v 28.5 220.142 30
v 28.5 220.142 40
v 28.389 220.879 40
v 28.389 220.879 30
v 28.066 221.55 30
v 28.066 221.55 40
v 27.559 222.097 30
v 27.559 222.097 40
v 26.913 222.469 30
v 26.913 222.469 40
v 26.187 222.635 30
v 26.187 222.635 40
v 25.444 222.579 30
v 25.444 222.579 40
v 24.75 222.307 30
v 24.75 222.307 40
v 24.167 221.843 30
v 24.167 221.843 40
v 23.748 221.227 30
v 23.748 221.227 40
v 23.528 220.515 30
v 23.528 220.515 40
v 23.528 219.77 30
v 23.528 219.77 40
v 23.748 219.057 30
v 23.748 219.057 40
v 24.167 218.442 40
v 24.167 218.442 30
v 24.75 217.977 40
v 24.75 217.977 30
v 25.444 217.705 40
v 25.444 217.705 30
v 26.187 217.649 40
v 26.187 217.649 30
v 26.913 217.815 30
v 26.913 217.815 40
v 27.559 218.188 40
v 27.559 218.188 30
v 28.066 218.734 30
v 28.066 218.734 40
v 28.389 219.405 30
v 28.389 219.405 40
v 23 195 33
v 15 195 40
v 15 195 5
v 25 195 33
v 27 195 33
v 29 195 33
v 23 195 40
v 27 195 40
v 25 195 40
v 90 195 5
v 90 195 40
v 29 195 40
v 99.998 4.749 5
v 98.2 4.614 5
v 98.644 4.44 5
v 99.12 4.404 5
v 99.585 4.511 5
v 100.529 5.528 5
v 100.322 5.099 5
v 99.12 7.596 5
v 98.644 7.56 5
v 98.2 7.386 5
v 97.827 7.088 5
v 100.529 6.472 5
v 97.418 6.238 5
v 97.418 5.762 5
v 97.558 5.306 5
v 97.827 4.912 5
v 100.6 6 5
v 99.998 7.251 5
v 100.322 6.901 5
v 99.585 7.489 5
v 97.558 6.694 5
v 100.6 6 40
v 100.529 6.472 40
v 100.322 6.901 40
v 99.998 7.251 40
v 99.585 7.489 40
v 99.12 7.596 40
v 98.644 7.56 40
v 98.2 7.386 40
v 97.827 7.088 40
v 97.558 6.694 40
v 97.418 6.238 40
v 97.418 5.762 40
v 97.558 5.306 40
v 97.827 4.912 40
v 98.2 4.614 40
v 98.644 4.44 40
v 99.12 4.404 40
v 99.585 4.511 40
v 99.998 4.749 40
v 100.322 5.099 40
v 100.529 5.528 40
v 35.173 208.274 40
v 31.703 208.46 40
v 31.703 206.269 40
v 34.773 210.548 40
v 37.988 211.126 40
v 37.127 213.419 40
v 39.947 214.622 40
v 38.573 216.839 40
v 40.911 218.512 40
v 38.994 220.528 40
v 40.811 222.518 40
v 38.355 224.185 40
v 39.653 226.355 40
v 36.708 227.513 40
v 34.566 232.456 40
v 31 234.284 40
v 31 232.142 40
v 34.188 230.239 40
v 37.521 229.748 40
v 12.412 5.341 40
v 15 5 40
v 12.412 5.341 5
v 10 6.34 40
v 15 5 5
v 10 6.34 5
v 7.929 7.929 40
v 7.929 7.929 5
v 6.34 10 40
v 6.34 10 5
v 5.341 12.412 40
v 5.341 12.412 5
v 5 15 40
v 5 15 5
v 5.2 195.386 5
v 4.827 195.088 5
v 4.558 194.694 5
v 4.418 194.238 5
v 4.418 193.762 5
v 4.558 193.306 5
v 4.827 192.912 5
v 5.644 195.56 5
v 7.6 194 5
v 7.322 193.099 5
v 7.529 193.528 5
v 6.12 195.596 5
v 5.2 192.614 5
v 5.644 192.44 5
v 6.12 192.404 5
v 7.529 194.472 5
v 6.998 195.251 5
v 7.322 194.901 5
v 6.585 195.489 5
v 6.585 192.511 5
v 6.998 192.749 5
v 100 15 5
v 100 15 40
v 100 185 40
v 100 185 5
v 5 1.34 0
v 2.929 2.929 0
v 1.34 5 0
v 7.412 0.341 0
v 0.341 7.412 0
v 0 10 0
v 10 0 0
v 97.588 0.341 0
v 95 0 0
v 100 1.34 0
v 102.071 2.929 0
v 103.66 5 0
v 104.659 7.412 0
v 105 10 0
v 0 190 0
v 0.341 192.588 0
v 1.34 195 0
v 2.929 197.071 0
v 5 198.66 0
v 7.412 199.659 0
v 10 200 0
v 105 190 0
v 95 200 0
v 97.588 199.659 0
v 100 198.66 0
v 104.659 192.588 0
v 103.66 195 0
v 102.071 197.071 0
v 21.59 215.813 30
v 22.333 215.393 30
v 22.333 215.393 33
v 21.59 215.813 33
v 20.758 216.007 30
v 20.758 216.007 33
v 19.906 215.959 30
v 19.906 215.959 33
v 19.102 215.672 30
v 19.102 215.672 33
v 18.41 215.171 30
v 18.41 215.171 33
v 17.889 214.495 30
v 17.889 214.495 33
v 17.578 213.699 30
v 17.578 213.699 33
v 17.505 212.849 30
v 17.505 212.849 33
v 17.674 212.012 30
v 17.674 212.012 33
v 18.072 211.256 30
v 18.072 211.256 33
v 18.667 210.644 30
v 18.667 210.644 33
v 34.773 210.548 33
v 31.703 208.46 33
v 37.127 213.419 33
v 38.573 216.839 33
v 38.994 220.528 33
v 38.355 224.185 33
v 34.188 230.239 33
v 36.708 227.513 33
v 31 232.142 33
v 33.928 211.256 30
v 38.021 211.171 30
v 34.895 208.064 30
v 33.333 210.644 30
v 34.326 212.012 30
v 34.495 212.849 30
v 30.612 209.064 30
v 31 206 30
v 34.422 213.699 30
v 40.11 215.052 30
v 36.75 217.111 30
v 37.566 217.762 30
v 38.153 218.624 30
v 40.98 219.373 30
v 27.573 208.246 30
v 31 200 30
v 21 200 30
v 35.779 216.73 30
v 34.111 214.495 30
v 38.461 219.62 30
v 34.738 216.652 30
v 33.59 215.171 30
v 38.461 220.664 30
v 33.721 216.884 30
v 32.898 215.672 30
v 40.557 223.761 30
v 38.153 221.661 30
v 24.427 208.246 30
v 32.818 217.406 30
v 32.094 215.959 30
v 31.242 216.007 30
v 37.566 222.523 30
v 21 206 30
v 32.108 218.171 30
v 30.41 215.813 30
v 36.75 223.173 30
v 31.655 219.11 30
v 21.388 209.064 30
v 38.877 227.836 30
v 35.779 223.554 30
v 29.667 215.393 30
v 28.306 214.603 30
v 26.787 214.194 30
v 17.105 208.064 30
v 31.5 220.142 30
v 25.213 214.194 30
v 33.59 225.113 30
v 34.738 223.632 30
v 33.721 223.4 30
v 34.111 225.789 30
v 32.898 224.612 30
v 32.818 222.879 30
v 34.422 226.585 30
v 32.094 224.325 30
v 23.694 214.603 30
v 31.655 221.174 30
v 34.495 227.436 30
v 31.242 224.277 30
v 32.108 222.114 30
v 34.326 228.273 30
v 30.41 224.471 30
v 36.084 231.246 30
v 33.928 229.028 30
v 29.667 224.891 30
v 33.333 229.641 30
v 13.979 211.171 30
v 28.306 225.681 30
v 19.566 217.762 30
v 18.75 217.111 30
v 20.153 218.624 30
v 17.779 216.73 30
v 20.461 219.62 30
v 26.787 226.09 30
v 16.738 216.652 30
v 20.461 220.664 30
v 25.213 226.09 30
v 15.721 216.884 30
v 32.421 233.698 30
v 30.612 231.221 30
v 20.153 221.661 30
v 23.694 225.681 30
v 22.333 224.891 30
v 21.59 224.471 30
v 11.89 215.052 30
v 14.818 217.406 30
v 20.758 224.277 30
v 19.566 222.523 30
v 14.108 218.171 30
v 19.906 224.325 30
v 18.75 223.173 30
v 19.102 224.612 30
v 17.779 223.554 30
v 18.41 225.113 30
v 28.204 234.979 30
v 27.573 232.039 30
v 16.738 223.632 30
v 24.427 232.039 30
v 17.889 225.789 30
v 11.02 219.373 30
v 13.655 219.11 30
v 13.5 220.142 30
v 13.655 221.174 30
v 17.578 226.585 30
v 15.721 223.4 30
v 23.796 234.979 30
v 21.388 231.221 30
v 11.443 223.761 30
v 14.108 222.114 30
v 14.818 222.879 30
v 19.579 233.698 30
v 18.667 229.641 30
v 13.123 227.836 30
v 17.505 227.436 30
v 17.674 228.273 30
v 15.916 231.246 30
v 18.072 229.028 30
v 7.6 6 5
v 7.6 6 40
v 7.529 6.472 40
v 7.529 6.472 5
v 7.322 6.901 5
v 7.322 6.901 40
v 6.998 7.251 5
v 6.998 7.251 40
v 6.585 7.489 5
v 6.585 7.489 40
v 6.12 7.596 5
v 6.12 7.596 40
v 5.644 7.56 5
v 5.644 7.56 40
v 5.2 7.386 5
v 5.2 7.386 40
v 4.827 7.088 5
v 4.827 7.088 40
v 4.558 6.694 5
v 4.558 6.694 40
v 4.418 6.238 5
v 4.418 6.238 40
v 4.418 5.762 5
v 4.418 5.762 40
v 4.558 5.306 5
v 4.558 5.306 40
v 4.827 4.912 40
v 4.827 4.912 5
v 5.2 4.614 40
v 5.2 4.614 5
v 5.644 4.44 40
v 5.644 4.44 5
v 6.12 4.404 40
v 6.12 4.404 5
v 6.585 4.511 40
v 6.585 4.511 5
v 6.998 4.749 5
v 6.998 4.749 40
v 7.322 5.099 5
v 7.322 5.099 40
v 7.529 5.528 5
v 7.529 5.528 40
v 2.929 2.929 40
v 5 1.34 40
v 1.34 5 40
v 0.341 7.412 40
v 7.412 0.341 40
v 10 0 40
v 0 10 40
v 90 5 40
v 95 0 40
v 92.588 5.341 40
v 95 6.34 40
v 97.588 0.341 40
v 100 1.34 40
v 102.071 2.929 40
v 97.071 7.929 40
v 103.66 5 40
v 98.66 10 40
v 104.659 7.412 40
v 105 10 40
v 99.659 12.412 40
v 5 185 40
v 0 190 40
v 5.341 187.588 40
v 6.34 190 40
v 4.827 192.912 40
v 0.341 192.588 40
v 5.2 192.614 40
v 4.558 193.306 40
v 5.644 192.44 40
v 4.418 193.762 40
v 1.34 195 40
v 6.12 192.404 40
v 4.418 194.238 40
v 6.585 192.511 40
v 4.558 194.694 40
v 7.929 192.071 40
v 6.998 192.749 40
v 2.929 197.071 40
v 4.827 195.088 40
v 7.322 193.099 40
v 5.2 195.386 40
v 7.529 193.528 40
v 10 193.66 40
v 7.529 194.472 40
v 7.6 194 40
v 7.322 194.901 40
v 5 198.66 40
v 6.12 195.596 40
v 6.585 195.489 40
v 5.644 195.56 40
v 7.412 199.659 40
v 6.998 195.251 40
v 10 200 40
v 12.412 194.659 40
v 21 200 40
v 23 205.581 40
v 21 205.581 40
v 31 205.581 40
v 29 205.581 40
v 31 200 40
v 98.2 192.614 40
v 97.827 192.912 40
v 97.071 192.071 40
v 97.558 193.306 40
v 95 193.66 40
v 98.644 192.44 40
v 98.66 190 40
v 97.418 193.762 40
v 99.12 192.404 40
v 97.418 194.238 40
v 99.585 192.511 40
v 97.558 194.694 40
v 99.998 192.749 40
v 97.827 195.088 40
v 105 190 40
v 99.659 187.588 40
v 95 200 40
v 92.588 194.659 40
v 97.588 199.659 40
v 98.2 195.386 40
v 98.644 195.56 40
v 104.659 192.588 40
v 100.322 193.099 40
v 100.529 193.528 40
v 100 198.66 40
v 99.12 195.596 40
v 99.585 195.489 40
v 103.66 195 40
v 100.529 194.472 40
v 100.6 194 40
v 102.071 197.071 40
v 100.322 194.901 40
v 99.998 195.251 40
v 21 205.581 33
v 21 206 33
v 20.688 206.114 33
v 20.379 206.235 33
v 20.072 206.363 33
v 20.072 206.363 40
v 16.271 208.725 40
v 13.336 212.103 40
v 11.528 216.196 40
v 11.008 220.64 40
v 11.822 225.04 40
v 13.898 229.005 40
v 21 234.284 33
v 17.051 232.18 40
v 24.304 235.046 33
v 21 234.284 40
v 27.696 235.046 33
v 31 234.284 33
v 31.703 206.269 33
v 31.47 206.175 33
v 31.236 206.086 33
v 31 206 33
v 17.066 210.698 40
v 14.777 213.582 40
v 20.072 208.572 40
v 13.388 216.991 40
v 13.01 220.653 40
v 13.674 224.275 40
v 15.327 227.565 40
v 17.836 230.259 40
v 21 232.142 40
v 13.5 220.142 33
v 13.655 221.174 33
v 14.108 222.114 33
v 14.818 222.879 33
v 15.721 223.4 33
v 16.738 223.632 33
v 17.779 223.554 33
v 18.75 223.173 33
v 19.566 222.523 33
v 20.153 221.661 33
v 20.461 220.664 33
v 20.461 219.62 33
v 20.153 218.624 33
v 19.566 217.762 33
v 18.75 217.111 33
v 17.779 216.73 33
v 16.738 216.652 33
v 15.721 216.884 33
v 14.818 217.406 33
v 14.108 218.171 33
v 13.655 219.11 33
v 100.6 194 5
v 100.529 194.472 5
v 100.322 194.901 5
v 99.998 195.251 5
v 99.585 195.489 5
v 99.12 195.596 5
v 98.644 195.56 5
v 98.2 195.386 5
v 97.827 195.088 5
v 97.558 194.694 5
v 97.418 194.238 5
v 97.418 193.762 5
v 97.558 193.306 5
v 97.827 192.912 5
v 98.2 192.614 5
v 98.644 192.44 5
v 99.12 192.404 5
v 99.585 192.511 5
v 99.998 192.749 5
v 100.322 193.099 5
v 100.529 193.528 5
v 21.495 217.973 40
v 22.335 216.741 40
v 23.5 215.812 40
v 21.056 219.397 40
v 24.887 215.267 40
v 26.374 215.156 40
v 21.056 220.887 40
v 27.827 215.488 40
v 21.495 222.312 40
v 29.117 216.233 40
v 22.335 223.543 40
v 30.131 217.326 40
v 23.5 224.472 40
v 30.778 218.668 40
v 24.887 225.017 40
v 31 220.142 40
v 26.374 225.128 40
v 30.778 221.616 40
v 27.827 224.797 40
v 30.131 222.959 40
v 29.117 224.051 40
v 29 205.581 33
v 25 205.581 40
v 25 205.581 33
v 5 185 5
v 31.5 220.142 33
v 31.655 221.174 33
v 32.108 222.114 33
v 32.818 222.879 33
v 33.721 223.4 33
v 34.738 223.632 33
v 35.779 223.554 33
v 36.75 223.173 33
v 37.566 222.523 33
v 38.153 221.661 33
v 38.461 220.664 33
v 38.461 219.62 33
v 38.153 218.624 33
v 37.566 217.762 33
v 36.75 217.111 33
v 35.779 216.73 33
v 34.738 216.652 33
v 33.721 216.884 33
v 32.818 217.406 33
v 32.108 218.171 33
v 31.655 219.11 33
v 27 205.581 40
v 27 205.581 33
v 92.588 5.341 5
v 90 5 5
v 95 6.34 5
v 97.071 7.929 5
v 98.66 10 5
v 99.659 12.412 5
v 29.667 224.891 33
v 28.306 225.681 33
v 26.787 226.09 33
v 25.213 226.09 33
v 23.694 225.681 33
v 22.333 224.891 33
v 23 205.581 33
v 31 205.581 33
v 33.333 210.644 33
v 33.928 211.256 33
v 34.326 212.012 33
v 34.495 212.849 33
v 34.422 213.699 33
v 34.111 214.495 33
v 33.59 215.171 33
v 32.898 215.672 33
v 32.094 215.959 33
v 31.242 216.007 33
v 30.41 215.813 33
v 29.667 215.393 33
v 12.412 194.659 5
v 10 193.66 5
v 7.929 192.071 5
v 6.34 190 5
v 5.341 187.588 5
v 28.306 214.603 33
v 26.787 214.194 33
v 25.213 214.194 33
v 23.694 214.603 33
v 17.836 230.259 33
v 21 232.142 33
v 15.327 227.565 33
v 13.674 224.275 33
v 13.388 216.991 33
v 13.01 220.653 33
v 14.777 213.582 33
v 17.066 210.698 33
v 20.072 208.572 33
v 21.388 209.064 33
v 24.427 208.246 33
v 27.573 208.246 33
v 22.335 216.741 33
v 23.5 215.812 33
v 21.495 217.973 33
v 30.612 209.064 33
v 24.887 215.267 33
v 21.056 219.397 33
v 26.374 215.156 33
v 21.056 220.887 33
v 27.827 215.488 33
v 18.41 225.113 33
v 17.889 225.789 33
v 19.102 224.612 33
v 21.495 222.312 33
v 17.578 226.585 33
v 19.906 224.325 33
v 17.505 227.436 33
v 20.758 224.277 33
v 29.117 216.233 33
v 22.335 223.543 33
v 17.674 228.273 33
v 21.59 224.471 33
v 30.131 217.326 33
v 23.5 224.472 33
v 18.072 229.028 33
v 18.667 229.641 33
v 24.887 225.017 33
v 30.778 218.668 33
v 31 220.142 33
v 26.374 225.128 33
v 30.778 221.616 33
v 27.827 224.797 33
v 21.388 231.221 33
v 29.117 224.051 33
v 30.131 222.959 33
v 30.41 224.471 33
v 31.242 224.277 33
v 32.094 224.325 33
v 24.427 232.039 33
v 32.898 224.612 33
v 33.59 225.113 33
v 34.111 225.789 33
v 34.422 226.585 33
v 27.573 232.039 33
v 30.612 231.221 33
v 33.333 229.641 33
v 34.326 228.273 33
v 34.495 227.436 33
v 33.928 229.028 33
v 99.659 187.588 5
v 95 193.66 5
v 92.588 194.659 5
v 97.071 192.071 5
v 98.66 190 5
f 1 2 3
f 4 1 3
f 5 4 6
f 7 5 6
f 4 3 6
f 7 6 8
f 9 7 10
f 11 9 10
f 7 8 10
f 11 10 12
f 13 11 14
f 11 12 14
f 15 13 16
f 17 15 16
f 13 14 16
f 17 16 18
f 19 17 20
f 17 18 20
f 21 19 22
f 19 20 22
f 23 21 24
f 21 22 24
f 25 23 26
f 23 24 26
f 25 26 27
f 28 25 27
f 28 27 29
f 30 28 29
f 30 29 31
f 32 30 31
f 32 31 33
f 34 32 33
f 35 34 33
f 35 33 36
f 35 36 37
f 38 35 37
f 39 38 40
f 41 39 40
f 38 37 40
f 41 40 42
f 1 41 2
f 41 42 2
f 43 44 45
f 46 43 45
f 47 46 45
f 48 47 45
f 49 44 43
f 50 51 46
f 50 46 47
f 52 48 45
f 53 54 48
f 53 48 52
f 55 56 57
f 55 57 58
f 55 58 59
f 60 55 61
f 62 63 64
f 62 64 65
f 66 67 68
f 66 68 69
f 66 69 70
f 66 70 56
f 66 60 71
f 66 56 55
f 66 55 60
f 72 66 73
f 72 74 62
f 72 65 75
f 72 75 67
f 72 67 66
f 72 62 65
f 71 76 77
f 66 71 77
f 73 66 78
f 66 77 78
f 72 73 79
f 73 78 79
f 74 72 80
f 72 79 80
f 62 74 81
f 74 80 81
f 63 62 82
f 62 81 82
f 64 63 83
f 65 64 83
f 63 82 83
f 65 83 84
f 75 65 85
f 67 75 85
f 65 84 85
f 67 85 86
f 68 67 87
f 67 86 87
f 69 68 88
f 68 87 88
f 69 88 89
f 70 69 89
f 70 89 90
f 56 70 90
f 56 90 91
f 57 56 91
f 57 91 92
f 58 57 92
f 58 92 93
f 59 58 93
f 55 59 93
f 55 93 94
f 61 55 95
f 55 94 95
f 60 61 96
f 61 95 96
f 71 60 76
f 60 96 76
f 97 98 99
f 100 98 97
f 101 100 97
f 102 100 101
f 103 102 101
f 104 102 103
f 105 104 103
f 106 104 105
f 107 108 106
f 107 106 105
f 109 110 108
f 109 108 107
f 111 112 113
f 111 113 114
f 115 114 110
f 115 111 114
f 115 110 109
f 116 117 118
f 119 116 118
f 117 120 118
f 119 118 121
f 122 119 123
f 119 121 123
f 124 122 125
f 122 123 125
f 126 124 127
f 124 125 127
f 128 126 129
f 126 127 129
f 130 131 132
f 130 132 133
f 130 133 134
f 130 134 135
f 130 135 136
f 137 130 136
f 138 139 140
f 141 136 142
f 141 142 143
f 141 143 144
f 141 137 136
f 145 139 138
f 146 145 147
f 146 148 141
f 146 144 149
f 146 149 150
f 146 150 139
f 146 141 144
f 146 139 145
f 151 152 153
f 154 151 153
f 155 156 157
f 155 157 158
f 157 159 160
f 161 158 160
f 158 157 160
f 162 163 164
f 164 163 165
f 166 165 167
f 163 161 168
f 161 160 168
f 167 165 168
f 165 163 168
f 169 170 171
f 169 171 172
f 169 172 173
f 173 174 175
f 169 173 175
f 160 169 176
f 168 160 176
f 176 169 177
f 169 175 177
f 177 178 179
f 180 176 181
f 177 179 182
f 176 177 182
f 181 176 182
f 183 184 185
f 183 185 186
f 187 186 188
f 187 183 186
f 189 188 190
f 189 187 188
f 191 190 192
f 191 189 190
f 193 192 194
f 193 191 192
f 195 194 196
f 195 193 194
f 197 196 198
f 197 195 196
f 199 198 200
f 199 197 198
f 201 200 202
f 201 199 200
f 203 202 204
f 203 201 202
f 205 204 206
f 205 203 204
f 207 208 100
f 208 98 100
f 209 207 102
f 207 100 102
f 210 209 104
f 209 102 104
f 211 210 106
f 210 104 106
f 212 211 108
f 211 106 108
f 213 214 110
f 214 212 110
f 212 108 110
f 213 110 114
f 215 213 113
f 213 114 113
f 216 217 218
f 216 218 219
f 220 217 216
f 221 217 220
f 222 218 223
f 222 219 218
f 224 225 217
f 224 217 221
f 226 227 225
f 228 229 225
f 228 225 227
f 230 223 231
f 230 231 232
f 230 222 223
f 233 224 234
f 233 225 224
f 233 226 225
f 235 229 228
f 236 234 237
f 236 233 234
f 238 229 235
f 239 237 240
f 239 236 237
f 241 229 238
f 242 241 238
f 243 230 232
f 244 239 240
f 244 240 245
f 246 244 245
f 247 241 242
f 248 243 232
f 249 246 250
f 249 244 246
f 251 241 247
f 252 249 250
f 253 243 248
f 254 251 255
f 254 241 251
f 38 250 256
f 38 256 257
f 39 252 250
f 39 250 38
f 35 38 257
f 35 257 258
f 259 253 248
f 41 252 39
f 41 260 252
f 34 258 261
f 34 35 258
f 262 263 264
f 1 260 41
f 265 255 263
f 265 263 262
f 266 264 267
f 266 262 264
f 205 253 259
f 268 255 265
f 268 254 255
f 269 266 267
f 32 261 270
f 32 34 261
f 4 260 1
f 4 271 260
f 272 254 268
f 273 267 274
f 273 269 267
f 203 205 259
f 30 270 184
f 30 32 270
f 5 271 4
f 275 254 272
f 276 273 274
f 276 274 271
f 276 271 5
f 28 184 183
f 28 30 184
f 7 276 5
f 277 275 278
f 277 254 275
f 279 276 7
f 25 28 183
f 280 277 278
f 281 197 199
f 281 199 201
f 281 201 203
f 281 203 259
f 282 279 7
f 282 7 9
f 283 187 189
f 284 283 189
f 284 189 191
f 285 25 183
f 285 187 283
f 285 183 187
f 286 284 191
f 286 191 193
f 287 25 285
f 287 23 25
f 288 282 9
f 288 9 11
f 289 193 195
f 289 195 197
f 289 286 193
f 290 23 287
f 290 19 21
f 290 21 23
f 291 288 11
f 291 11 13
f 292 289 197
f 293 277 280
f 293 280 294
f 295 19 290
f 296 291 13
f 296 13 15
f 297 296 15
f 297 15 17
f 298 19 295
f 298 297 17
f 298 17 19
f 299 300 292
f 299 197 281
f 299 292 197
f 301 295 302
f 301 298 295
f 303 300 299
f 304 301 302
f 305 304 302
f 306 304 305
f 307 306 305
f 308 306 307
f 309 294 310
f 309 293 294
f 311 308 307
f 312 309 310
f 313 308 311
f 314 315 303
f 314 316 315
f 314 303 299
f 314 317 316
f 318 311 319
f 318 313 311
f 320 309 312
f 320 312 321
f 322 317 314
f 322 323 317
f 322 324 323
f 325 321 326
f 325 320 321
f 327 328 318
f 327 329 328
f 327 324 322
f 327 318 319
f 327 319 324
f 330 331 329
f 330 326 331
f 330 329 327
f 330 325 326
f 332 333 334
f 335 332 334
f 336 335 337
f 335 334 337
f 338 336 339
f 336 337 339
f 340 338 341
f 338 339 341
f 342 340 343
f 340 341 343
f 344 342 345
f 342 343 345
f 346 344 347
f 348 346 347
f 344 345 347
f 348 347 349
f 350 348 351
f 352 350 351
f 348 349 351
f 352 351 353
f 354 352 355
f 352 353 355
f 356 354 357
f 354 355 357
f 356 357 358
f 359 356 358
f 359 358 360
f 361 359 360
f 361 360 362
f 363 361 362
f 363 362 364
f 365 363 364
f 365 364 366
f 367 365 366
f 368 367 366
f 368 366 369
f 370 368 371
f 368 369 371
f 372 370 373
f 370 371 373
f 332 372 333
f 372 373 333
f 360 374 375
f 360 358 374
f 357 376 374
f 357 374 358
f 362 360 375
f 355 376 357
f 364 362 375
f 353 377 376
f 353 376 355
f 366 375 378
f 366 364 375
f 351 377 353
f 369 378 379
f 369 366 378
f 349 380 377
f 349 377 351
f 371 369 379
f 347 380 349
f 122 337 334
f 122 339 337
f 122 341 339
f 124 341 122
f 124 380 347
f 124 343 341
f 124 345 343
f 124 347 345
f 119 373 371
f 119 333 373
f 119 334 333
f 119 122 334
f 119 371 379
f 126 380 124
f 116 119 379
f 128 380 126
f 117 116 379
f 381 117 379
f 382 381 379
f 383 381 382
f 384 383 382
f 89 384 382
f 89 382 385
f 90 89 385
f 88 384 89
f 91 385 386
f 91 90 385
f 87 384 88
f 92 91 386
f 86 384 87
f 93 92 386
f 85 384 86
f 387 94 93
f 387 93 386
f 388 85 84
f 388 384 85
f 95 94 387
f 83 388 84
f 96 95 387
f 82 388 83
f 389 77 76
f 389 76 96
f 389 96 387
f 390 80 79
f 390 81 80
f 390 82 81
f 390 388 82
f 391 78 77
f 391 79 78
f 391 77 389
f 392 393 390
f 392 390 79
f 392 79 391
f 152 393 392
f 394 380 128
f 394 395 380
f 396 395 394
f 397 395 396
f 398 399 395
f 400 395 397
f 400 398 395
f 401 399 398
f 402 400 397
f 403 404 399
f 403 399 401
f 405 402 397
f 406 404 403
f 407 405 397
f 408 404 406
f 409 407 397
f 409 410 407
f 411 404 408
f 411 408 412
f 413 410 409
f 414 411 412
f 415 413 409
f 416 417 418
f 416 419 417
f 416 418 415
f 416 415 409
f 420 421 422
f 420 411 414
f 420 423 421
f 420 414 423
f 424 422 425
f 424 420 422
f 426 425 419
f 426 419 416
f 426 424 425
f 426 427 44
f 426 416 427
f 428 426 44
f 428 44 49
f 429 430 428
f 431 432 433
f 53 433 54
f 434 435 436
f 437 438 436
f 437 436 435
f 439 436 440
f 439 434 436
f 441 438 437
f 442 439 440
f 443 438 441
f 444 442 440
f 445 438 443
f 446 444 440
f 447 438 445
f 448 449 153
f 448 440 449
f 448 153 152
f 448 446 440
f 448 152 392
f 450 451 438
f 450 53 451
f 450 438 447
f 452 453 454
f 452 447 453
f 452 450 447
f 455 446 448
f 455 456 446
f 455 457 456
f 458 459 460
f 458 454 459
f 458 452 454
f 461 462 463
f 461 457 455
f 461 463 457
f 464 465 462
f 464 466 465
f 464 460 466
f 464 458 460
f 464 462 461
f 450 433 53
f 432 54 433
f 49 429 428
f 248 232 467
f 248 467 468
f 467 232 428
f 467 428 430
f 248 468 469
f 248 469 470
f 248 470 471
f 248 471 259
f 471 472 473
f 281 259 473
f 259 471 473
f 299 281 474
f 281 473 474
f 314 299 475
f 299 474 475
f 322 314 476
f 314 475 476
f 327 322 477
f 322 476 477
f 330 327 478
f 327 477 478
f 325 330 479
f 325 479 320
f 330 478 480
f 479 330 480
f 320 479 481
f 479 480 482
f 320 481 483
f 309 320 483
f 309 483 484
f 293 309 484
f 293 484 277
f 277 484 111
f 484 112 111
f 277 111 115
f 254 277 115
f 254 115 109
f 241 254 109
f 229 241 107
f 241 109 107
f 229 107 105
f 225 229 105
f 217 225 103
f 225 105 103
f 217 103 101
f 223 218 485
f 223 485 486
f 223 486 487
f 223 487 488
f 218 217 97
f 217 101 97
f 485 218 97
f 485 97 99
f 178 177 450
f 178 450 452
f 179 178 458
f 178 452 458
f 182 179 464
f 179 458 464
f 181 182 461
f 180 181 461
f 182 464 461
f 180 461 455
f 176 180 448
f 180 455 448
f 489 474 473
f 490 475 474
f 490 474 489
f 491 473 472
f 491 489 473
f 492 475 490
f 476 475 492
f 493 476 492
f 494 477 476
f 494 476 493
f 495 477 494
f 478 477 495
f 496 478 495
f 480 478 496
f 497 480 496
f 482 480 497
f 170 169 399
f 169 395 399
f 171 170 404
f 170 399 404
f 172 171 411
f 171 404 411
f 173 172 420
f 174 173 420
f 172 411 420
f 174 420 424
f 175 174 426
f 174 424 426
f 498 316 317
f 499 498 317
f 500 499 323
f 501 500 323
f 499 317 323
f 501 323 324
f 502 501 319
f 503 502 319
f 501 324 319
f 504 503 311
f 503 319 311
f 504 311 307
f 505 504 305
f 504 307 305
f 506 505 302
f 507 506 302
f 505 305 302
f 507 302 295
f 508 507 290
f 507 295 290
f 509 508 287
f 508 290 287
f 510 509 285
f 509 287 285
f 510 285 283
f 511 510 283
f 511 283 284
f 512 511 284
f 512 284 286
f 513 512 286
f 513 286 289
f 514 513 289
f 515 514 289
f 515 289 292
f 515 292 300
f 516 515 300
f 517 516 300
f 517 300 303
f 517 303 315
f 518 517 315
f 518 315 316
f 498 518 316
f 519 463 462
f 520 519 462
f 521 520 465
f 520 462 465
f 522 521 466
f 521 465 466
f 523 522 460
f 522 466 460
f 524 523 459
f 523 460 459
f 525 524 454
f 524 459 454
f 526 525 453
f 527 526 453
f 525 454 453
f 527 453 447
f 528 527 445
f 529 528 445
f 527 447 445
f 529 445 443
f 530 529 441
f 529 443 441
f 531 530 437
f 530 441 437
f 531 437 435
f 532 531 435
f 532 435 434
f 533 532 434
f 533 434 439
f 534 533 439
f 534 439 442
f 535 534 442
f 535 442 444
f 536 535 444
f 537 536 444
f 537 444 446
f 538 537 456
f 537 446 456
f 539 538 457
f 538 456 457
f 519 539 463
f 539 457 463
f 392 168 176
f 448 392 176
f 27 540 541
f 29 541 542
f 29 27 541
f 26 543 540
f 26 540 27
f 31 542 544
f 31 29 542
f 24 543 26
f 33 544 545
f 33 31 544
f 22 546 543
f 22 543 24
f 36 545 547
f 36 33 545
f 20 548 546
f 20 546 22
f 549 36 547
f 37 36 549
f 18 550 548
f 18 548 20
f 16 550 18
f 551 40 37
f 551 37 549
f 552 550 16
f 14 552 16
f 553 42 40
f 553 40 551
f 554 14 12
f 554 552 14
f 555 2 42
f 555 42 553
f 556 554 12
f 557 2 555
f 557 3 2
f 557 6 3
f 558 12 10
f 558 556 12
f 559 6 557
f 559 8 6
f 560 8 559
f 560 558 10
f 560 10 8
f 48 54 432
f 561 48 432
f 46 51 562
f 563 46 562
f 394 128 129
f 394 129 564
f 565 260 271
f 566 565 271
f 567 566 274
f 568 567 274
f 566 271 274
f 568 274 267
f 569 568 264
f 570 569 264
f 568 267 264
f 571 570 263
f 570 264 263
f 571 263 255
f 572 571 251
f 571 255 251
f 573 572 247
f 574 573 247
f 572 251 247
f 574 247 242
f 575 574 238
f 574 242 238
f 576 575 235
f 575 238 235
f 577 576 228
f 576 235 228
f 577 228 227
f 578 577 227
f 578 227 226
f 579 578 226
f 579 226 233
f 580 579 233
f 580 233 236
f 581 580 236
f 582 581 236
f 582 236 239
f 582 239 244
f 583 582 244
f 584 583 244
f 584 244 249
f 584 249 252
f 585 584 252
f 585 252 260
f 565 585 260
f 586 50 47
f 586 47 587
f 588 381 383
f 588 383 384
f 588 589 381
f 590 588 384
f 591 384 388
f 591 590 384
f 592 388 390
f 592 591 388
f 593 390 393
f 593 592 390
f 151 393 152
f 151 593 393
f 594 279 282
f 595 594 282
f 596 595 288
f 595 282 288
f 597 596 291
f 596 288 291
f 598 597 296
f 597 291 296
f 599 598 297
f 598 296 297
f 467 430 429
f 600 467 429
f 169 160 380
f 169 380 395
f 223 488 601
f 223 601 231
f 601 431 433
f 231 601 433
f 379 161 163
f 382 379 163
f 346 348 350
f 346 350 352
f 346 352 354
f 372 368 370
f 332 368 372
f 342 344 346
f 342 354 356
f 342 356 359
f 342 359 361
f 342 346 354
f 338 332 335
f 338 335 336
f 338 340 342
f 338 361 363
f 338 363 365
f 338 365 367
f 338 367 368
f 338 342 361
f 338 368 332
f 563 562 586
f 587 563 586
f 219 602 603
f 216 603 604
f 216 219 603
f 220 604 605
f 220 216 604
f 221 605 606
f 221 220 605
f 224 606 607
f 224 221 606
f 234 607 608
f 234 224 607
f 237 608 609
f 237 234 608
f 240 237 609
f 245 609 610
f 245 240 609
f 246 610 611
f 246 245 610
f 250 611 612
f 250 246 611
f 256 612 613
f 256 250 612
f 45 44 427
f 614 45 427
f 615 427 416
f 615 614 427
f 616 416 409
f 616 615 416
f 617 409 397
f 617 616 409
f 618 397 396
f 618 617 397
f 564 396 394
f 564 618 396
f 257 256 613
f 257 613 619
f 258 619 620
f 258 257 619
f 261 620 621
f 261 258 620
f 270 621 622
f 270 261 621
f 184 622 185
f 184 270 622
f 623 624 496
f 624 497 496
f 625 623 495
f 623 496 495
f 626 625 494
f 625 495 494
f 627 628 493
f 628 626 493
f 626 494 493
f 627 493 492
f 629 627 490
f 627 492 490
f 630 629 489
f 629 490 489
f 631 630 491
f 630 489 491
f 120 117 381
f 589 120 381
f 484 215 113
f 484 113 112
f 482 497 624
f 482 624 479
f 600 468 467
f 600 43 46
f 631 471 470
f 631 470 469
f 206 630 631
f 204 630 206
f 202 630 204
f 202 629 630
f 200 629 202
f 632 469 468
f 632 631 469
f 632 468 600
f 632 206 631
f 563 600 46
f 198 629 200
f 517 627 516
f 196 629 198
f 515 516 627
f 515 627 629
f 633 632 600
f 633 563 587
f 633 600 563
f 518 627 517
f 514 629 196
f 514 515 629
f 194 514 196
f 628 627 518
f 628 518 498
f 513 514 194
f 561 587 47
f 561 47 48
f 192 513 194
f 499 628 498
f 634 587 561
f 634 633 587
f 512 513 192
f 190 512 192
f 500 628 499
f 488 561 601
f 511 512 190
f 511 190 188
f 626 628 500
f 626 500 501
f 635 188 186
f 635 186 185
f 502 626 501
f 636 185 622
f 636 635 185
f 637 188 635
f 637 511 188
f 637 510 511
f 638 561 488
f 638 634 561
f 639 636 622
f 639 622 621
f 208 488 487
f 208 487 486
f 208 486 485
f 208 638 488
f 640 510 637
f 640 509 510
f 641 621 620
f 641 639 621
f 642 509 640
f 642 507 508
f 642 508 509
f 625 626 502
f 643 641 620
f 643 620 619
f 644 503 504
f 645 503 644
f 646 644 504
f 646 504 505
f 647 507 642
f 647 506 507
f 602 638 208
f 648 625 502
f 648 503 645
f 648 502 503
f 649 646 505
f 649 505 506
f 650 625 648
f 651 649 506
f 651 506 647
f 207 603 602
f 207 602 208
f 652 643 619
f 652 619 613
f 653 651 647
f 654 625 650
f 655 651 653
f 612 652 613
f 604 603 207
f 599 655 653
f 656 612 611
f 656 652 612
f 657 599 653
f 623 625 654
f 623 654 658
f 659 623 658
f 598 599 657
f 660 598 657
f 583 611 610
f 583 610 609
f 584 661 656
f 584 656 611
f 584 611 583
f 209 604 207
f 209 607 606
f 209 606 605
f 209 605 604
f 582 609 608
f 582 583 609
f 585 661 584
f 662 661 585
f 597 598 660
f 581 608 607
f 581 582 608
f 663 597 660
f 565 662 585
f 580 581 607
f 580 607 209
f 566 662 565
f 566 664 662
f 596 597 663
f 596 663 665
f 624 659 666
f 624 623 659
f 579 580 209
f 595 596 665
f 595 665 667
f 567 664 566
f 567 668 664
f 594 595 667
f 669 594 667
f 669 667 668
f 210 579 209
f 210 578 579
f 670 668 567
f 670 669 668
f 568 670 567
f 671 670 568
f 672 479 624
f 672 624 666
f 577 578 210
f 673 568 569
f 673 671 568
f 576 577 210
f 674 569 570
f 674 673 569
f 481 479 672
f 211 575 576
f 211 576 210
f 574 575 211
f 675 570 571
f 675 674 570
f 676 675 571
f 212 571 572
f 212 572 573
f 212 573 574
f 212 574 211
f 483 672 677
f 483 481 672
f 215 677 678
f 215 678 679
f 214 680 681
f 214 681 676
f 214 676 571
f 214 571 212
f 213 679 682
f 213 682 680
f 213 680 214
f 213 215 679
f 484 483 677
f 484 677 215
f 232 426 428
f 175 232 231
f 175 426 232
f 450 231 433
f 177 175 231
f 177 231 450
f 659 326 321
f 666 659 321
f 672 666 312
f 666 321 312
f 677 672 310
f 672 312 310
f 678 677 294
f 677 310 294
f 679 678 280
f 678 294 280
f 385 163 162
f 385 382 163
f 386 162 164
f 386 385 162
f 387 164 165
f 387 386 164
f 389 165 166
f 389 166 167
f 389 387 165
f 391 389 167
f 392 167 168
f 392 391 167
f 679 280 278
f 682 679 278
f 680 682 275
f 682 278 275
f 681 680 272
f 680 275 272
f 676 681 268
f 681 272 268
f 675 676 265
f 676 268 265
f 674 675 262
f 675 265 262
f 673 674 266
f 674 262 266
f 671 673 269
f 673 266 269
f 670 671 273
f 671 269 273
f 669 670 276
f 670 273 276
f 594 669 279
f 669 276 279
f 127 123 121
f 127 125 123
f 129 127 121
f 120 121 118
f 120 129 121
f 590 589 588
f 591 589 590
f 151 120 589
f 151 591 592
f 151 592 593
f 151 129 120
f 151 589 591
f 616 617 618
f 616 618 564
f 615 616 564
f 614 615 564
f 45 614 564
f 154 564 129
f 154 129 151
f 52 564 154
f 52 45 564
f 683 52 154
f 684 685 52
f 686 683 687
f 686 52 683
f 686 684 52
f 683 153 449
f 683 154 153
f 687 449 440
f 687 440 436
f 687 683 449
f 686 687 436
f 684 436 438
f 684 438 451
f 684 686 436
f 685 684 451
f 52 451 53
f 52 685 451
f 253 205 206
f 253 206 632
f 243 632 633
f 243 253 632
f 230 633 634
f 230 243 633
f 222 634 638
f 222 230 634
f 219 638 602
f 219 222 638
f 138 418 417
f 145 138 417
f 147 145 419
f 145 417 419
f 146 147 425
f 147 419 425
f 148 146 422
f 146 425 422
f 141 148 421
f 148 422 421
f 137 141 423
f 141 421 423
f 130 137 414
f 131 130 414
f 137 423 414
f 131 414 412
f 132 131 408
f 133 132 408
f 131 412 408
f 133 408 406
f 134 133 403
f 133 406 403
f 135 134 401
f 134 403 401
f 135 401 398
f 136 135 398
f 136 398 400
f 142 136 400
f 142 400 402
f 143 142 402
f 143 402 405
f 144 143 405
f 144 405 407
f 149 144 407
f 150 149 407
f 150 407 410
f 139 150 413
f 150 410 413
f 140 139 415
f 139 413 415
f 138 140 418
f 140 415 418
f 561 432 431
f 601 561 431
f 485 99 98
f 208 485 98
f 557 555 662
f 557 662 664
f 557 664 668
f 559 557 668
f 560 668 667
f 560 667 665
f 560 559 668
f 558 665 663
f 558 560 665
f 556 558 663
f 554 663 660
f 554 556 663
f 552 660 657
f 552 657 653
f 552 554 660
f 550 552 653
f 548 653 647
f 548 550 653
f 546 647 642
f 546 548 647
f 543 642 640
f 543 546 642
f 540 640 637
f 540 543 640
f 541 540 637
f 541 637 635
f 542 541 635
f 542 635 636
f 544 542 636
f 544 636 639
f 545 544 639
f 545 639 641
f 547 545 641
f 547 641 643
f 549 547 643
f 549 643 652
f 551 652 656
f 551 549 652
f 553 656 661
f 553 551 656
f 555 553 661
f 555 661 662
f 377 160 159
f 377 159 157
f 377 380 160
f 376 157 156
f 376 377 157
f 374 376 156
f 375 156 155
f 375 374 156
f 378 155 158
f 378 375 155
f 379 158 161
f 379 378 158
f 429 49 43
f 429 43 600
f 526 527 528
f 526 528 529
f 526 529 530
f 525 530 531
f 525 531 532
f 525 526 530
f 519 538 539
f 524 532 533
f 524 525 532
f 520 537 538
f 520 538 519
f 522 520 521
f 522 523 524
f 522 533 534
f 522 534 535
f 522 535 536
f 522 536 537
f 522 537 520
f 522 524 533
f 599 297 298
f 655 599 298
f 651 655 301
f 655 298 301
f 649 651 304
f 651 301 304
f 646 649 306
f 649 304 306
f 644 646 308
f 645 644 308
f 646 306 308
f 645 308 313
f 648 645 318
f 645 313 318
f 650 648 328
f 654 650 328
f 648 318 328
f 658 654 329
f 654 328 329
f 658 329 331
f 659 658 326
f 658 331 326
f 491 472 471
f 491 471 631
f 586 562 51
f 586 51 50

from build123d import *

# Parameters (mm, degrees)
SKETCH1_W           = 105
SKETCH1_H           = 200
BOSS_EXTRUDE1_DEPTH = 40
SKETCH2_W           = 95
SKETCH2_H           = 190
CUT_EXTRUDE1_DEPTH  = 35
FILLET1_R           = 10
SKETCH3_R           = 1.6
CUT_EXTRUDE2_DEPTH  = 35
BOSS_EXTRUDE2_DEPTH = 10
SKETCH6_R           = 2.5
CUT_EXTRUDE3_DEPTH  = 10
SKETCH7_R           = 13
SKETCH7_R_2         = 5
CUT_EXTRUDE5_DEPTH  = 7
SKETCH9_W           = 10
SKETCH9_H           = 4.718519443
CUT_EXTRUDE8_DEPTH  = 7
SKETCH10_W          = 11.630652226
SKETCH10_H          = 3.85031924
CUT_EXTRUDE11_DEPTH = 7
SKETCH11_W          = 2
SKETCH11_H          = 11.091513068
SKETCH11_H_2        = 11.156323384
CUT_EXTRUDE12_DEPTH = 7
CUT_EXTRUDE13_DEPTH = 7
SKETCH13_R          = 3.5
CUT_EXTRUDE14_DEPTH = 7


with BuildPart() as part:
    # Sketch1 → Boss-Extrude1 (new body)
    with BuildSketch(Plane.XY):
        with Locations((52.5, 100)):
            Rectangle(SKETCH1_W, SKETCH1_H)
    extrude(amount=BOSS_EXTRUDE1_DEPTH)

    # Sketch2 → Cut-Extrude1 (cut)
    with BuildSketch(Plane.XY.offset(40)):
        with Locations((52.5, 100)):
            Rectangle(SKETCH2_W, SKETCH2_H)
    extrude(amount=-CUT_EXTRUDE1_DEPTH, mode=Mode.SUBTRACT)

    # Fillet1
    fillet1_edges = [part.edges().sort_by_distance(p)[0] for p in [
        (5, 195, 22.5),
        (100, 195, 22.5),
        (100, 5, 22.5),
        (5, 5, 22.5),
        (0, 200, 20),
        (105, 200, 20),
        (105, 0, 20),
        (0, 0, 20),
    ]]
    fillet(fillet1_edges, radius=FILLET1_R)

    # Sketch3 → Cut-Extrude2 (cut)
    with BuildSketch(Plane.XY.offset(40)):
        with Locations((6, 194)):
            Circle(SKETCH3_R)
        with Locations((99, 194)):
            Circle(SKETCH3_R)
        with Locations((99, 6)):
            Circle(SKETCH3_R)
        with Locations((6, 6)):
            Circle(SKETCH3_R)
    extrude(amount=-CUT_EXTRUDE2_DEPTH, mode=Mode.SUBTRACT)

    # Sketch4 → Boss-Extrude2 (add)
    with BuildSketch(Plane.XY.offset(40)):
        with BuildLine():
            Line((21, 200), (21, 206))
            ThreePointArc((21, 206), (26, 235.142135624), (31, 206))
            Line((31, 206), (31, 200))
            Line((31, 200), (21, 200))
        make_face()
    extrude(amount=-BOSS_EXTRUDE2_DEPTH)

    # Sketch6 → Cut-Extrude3 (cut)
    with BuildSketch(Plane.XY.offset(40)):
        with Locations((26, 220.142135624)):
            Circle(SKETCH6_R)
    extrude(amount=-CUT_EXTRUDE3_DEPTH, mode=Mode.SUBTRACT)

    # Sketch7 → Cut-Extrude5 (cut)
    with BuildSketch(Plane.XY.offset(40)):
        with Locations((26, 220.142135624)):
            Circle(SKETCH7_R)
        with Locations((26, 220.142135624)):
            Circle(SKETCH7_R_2, mode=Mode.SUBTRACT)
    extrude(amount=-CUT_EXTRUDE5_DEPTH, mode=Mode.SUBTRACT)

    # Sketch9 → Cut-Extrude8 (cut)
    with BuildSketch(Plane.XY.offset(40)):
        with Locations((26, 233.858468974)):
            Rectangle(SKETCH9_W, SKETCH9_H)
    extrude(amount=-CUT_EXTRUDE8_DEPTH, mode=Mode.SUBTRACT)

    # Sketch10 → Cut-Extrude11 (cut)
    with BuildSketch(Plane.XY.offset(40)):
        with Locations((25.887552525, 207.506070883)):
            Rectangle(SKETCH10_W, SKETCH10_H)
    extrude(amount=-CUT_EXTRUDE11_DEPTH, mode=Mode.SUBTRACT)

    # Sketch11 → Cut-Extrude12 (cut)
    with BuildSketch(Plane.XY.offset(40)):
        with Locations((24, 200.229066802)):
            Rectangle(SKETCH11_W, SKETCH11_H)
        with Locations((28, 200.296138355)):
            Rectangle(SKETCH11_W, SKETCH11_H_2)
    extrude(amount=-CUT_EXTRUDE12_DEPTH, mode=Mode.SUBTRACT)

    # Sketch12 → Cut-Extrude13 (cut)
    with BuildSketch(Plane(origin=(0, 0, 30), x_dir=(-1, 0, 0), z_dir=(0, 0, -1))):
        with BuildLine():
            ThreePointArc((-18.666666667, 229.640673523), (-26, 232.142135624), (-33.333333333, 229.640673523))
            ThreePointArc((-33.333333333, 229.640673523), (-33.874634475, 225.432705715), (-29.666666667, 224.891404573))
            ThreePointArc((-29.666666667, 224.891404573), (-26, 226.142135624), (-22.333333333, 224.891404573))
            ThreePointArc((-22.333333333, 224.891404573), (-18.125365525, 225.432705715), (-18.666666667, 229.640673523))
        make_face()
        with BuildLine():
            ThreePointArc((-18.666666667, 210.643597725), (-26, 208.142135624), (-33.333333333, 210.643597725))
            ThreePointArc((-33.333333333, 210.643597725), (-33.874634475, 214.851565533), (-29.666666667, 215.392866674))
            ThreePointArc((-29.666666667, 215.392866674), (-26, 214.142135624), (-22.333333333, 215.392866674))
            ThreePointArc((-22.333333333, 215.392866674), (-18.125365525, 214.851565533), (-18.666666667, 210.643597725))
        make_face()
    extrude(amount=-CUT_EXTRUDE13_DEPTH, mode=Mode.SUBTRACT)

    # Sketch13 → Cut-Extrude14 (cut)
    with BuildSketch(Plane(origin=(0, 0, 30), x_dir=(-1, 0, 0), z_dir=(0, 0, -1))):
        with Locations((-17, 220.142135624)):
            Circle(SKETCH13_R)
        with Locations((-35, 220.142135624)):
            Circle(SKETCH13_R)
    extrude(amount=-CUT_EXTRUDE14_DEPTH, mode=Mode.SUBTRACT)


solid = part.part
